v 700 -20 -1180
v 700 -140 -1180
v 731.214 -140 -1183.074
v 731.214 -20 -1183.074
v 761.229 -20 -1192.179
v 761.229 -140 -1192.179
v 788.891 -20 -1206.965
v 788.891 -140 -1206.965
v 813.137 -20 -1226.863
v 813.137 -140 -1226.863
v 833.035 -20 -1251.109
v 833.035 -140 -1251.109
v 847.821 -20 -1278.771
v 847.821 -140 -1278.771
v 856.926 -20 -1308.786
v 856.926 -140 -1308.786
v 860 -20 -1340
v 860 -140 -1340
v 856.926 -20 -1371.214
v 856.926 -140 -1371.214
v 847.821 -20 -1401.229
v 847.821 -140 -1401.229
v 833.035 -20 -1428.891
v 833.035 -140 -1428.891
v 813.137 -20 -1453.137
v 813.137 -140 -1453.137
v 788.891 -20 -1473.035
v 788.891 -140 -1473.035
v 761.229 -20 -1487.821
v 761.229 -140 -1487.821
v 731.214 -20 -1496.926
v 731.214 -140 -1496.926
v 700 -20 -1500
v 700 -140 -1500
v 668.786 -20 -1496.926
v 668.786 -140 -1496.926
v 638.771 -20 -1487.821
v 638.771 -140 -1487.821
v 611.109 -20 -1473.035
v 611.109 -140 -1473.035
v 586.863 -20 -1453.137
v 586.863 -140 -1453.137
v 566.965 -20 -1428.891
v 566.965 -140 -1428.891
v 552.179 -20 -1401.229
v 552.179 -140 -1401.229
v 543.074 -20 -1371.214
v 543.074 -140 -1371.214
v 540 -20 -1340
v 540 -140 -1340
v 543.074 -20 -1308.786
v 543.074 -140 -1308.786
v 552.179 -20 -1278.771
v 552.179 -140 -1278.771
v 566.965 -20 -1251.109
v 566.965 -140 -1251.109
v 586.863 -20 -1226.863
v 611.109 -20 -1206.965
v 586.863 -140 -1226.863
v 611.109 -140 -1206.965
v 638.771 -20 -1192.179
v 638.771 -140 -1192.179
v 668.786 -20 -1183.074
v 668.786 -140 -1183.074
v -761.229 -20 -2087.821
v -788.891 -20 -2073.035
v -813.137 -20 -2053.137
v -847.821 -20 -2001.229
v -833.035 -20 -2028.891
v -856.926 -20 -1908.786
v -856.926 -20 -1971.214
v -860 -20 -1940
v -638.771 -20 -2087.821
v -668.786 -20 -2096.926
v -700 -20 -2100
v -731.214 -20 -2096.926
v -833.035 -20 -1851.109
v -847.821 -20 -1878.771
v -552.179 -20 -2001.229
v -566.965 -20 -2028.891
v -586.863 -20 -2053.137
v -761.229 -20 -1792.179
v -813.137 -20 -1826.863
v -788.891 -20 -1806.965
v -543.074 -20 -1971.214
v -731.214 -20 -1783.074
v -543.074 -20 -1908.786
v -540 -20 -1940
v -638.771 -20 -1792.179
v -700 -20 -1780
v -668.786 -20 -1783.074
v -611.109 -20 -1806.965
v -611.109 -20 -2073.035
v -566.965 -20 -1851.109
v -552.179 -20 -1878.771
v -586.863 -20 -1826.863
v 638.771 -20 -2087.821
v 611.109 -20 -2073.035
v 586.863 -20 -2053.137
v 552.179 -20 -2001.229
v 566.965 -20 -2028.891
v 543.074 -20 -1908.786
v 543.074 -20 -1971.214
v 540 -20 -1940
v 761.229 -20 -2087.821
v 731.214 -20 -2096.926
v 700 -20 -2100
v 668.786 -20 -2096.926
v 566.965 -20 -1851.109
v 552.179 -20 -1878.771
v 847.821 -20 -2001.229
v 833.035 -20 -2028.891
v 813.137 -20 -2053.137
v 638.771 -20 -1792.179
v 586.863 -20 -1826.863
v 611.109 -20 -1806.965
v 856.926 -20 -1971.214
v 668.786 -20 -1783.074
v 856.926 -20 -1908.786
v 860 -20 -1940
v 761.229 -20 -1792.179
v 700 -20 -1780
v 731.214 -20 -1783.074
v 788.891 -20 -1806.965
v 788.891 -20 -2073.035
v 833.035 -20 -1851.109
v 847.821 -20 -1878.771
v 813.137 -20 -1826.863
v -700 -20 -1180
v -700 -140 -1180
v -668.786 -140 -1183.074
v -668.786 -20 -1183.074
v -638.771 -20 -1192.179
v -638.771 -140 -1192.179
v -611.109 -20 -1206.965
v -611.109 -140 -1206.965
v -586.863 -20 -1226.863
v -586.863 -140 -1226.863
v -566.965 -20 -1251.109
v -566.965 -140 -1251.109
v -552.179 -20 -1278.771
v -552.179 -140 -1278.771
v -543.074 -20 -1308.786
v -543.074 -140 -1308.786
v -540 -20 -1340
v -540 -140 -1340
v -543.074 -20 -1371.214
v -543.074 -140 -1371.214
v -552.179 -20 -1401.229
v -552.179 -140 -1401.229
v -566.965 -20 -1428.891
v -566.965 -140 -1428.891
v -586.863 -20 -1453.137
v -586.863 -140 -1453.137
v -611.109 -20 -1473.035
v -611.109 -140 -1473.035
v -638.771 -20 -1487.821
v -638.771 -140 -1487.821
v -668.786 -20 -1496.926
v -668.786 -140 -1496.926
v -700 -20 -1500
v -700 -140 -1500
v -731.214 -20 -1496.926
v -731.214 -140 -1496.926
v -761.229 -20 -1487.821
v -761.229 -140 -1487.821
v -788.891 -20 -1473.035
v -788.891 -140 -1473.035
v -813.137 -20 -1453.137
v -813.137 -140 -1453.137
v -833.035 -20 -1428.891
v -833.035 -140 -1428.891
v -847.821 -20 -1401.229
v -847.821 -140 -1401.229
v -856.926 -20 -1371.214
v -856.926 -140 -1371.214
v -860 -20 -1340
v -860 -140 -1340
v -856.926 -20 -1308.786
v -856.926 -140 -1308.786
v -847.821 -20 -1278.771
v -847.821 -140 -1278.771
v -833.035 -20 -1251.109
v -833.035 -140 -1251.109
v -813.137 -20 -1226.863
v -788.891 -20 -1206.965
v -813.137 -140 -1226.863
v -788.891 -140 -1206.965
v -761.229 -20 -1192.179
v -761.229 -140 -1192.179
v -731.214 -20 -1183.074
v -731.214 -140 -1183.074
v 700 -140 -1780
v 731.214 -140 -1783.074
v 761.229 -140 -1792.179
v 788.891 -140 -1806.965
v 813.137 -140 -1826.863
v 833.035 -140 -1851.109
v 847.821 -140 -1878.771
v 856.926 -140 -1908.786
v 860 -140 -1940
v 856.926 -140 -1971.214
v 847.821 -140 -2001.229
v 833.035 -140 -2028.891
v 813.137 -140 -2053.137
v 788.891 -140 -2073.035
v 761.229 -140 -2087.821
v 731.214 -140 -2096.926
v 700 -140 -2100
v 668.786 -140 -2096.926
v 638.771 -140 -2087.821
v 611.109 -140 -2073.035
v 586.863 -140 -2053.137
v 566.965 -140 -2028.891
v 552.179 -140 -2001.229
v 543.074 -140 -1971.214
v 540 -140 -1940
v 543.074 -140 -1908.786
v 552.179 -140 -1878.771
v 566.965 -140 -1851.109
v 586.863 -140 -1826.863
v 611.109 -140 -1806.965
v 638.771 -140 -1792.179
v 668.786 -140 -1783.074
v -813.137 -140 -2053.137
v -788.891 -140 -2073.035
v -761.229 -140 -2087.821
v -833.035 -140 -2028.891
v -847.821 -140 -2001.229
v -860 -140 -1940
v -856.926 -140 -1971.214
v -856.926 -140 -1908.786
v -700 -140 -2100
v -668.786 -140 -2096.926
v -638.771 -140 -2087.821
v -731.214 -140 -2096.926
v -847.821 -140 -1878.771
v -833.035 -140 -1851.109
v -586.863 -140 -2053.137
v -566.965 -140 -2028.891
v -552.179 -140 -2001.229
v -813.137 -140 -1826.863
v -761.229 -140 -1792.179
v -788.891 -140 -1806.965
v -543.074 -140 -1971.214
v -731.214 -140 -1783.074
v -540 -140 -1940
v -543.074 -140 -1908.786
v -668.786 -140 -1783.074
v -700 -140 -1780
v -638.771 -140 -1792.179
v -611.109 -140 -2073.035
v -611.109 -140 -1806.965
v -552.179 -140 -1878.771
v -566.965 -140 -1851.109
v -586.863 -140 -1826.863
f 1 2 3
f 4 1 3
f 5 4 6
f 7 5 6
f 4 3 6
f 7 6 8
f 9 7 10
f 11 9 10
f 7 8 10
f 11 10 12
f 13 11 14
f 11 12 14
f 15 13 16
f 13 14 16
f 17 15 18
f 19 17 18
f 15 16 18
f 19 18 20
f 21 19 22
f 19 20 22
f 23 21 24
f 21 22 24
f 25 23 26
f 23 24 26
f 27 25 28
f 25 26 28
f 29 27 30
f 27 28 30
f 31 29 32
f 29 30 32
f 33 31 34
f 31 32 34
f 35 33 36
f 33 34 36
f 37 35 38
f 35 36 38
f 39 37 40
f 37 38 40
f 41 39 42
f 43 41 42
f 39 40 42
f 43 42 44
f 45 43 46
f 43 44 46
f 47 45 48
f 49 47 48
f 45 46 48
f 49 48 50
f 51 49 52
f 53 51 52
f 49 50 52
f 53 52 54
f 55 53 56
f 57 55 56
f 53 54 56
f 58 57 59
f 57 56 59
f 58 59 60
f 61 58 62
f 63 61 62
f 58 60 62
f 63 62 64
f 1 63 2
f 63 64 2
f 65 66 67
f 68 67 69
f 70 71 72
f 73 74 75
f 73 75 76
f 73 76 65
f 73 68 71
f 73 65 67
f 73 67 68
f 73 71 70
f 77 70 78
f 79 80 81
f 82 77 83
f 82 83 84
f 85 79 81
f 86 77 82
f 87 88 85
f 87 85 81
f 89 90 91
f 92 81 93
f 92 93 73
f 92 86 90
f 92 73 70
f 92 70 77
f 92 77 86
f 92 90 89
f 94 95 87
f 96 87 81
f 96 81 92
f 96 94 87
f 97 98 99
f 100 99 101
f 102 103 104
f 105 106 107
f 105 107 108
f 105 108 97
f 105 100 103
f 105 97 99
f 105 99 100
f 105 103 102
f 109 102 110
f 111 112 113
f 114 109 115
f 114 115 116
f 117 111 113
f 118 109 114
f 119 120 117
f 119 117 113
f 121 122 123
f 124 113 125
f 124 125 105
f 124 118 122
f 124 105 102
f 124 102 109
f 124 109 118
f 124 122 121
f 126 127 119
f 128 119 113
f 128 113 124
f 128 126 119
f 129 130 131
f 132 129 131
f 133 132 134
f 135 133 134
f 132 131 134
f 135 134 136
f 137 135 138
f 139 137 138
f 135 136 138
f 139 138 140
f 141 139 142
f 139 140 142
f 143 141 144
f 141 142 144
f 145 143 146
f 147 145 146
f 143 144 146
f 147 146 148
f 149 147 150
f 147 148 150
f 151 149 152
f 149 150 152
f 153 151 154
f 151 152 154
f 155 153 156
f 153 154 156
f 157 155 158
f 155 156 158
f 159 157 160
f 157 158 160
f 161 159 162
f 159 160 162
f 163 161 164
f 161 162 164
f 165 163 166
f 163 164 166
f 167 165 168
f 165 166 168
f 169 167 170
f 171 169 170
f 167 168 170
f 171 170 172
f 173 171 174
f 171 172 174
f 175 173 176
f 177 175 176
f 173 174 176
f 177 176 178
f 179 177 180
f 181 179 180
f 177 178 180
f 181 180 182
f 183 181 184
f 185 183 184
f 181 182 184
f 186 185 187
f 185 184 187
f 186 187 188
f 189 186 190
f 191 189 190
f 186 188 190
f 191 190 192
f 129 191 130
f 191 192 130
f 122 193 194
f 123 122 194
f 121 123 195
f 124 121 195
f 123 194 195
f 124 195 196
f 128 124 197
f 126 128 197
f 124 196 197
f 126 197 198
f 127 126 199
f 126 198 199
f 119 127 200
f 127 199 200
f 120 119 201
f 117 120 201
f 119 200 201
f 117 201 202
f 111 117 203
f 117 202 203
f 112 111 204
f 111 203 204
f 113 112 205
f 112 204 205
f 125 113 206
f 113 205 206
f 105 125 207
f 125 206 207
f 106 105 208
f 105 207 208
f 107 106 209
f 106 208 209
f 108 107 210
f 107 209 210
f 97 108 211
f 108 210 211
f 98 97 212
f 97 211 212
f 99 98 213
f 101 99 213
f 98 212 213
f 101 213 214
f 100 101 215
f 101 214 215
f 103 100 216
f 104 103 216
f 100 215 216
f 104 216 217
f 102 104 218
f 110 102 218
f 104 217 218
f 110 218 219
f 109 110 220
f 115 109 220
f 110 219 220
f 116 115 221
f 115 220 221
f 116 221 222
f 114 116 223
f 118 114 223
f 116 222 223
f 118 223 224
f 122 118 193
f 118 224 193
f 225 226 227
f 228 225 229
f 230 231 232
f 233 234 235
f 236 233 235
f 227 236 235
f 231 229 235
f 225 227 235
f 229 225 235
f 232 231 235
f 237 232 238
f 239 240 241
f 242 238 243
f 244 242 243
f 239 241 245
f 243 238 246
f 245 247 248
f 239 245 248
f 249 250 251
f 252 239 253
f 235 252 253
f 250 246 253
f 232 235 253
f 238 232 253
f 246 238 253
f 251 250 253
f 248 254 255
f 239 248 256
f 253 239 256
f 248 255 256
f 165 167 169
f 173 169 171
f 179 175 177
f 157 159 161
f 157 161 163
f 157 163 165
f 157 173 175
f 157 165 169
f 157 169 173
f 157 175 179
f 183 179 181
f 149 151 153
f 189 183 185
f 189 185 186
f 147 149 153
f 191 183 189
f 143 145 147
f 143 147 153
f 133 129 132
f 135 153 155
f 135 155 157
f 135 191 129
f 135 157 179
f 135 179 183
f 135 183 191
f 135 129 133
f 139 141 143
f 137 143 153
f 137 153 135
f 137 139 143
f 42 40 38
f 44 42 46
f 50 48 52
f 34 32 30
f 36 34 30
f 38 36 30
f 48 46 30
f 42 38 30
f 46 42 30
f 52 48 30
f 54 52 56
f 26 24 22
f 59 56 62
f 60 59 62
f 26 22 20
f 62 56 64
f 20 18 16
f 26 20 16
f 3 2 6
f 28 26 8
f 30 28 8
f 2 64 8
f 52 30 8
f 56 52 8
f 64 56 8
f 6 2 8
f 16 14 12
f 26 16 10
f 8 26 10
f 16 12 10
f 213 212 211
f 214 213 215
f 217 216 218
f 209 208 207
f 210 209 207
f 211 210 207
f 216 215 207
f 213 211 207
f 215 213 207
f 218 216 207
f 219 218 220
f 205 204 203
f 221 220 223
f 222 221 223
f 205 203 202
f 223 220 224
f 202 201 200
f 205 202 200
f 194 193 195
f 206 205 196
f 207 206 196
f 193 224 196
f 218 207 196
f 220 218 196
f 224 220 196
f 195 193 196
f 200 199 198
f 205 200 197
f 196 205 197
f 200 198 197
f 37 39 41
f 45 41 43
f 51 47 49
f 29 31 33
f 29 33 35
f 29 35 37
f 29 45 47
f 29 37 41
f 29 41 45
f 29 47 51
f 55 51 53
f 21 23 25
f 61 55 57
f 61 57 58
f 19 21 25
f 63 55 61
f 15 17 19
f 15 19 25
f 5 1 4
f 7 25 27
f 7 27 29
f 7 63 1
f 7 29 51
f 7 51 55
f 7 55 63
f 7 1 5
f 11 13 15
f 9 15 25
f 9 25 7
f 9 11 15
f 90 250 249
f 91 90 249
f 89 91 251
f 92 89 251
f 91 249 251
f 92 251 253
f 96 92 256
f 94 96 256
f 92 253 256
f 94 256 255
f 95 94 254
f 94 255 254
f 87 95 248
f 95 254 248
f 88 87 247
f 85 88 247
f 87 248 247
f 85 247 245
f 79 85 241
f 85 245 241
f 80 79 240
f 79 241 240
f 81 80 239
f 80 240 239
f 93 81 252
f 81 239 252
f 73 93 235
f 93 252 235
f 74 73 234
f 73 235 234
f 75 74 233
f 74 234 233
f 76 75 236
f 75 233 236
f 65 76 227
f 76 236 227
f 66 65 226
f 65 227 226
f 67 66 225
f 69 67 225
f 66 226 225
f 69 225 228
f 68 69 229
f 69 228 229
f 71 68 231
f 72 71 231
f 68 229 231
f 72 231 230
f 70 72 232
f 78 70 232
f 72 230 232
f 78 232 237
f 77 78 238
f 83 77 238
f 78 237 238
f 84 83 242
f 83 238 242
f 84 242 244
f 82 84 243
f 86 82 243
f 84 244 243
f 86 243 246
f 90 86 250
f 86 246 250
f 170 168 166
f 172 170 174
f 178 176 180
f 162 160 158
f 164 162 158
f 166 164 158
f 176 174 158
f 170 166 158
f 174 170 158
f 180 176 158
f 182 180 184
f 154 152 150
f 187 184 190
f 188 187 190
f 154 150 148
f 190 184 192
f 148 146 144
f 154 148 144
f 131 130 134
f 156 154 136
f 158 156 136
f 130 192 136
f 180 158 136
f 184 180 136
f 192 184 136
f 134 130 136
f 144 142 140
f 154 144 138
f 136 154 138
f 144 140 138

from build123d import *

# Parameters (mm, degrees)
BOSS_EXTRUDE1_START = -140
SKETCH1_R           = 160
BOSS_EXTRUDE1_DEPTH = 120
BOSS_EXTRUDE2_START = -140
SKETCH2_R           = 160
BOSS_EXTRUDE2_DEPTH = 120
BOSS_EXTRUDE3_START = -140
SKETCH3_R           = 160
BOSS_EXTRUDE3_DEPTH = 120
BOSS_EXTRUDE4_START = -140
SKETCH4_R           = 160
BOSS_EXTRUDE4_DEPTH = 120


with BuildPart() as part:
    # Sketch1 → Boss-Extrude1 (new body)
    with BuildSketch(Plane(origin=(0, 0, 0), x_dir=(1, 0, 0), z_dir=(0, 1, 0)).offset(BOSS_EXTRUDE1_START)):
        with Locations(Location((-700, 1940, 0), (0, 0, 270))):
            Circle(SKETCH1_R)
    extrude(amount=BOSS_EXTRUDE1_DEPTH)


with BuildPart() as body_2:
    # Sketch2 → Boss-Extrude2 (new body)
    with BuildSketch(Plane(origin=(0, 0, 0), x_dir=(1, 0, 0), z_dir=(0, 1, 0)).offset(BOSS_EXTRUDE2_START)):
        with Locations(Location((-700, 1340, 0), (0, 0, 270))):
            Circle(SKETCH2_R)
    extrude(amount=BOSS_EXTRUDE2_DEPTH)


with BuildPart() as body_3:
    # Sketch3 → Boss-Extrude3 (new body)
    with BuildSketch(Plane(origin=(0, 0, 0), x_dir=(1, 0, 0), z_dir=(0, 1, 0)).offset(BOSS_EXTRUDE3_START)):
        with Locations(Location((700, 1940, 0), (0, 0, 270))):
            Circle(SKETCH3_R)
    extrude(amount=BOSS_EXTRUDE3_DEPTH)


with BuildPart() as body_4:
    # Sketch4 → Boss-Extrude4 (new body)
    with BuildSketch(Plane(origin=(0, 0, 0), x_dir=(1, 0, 0), z_dir=(0, 1, 0)).offset(BOSS_EXTRUDE4_START)):
        with Locations(Location((700, 1340, 0), (0, 0, 270))):
            Circle(SKETCH4_R)
    extrude(amount=BOSS_EXTRUDE4_DEPTH)


solid = Compound([part.part, body_2.part, body_3.part, body_4.part])
